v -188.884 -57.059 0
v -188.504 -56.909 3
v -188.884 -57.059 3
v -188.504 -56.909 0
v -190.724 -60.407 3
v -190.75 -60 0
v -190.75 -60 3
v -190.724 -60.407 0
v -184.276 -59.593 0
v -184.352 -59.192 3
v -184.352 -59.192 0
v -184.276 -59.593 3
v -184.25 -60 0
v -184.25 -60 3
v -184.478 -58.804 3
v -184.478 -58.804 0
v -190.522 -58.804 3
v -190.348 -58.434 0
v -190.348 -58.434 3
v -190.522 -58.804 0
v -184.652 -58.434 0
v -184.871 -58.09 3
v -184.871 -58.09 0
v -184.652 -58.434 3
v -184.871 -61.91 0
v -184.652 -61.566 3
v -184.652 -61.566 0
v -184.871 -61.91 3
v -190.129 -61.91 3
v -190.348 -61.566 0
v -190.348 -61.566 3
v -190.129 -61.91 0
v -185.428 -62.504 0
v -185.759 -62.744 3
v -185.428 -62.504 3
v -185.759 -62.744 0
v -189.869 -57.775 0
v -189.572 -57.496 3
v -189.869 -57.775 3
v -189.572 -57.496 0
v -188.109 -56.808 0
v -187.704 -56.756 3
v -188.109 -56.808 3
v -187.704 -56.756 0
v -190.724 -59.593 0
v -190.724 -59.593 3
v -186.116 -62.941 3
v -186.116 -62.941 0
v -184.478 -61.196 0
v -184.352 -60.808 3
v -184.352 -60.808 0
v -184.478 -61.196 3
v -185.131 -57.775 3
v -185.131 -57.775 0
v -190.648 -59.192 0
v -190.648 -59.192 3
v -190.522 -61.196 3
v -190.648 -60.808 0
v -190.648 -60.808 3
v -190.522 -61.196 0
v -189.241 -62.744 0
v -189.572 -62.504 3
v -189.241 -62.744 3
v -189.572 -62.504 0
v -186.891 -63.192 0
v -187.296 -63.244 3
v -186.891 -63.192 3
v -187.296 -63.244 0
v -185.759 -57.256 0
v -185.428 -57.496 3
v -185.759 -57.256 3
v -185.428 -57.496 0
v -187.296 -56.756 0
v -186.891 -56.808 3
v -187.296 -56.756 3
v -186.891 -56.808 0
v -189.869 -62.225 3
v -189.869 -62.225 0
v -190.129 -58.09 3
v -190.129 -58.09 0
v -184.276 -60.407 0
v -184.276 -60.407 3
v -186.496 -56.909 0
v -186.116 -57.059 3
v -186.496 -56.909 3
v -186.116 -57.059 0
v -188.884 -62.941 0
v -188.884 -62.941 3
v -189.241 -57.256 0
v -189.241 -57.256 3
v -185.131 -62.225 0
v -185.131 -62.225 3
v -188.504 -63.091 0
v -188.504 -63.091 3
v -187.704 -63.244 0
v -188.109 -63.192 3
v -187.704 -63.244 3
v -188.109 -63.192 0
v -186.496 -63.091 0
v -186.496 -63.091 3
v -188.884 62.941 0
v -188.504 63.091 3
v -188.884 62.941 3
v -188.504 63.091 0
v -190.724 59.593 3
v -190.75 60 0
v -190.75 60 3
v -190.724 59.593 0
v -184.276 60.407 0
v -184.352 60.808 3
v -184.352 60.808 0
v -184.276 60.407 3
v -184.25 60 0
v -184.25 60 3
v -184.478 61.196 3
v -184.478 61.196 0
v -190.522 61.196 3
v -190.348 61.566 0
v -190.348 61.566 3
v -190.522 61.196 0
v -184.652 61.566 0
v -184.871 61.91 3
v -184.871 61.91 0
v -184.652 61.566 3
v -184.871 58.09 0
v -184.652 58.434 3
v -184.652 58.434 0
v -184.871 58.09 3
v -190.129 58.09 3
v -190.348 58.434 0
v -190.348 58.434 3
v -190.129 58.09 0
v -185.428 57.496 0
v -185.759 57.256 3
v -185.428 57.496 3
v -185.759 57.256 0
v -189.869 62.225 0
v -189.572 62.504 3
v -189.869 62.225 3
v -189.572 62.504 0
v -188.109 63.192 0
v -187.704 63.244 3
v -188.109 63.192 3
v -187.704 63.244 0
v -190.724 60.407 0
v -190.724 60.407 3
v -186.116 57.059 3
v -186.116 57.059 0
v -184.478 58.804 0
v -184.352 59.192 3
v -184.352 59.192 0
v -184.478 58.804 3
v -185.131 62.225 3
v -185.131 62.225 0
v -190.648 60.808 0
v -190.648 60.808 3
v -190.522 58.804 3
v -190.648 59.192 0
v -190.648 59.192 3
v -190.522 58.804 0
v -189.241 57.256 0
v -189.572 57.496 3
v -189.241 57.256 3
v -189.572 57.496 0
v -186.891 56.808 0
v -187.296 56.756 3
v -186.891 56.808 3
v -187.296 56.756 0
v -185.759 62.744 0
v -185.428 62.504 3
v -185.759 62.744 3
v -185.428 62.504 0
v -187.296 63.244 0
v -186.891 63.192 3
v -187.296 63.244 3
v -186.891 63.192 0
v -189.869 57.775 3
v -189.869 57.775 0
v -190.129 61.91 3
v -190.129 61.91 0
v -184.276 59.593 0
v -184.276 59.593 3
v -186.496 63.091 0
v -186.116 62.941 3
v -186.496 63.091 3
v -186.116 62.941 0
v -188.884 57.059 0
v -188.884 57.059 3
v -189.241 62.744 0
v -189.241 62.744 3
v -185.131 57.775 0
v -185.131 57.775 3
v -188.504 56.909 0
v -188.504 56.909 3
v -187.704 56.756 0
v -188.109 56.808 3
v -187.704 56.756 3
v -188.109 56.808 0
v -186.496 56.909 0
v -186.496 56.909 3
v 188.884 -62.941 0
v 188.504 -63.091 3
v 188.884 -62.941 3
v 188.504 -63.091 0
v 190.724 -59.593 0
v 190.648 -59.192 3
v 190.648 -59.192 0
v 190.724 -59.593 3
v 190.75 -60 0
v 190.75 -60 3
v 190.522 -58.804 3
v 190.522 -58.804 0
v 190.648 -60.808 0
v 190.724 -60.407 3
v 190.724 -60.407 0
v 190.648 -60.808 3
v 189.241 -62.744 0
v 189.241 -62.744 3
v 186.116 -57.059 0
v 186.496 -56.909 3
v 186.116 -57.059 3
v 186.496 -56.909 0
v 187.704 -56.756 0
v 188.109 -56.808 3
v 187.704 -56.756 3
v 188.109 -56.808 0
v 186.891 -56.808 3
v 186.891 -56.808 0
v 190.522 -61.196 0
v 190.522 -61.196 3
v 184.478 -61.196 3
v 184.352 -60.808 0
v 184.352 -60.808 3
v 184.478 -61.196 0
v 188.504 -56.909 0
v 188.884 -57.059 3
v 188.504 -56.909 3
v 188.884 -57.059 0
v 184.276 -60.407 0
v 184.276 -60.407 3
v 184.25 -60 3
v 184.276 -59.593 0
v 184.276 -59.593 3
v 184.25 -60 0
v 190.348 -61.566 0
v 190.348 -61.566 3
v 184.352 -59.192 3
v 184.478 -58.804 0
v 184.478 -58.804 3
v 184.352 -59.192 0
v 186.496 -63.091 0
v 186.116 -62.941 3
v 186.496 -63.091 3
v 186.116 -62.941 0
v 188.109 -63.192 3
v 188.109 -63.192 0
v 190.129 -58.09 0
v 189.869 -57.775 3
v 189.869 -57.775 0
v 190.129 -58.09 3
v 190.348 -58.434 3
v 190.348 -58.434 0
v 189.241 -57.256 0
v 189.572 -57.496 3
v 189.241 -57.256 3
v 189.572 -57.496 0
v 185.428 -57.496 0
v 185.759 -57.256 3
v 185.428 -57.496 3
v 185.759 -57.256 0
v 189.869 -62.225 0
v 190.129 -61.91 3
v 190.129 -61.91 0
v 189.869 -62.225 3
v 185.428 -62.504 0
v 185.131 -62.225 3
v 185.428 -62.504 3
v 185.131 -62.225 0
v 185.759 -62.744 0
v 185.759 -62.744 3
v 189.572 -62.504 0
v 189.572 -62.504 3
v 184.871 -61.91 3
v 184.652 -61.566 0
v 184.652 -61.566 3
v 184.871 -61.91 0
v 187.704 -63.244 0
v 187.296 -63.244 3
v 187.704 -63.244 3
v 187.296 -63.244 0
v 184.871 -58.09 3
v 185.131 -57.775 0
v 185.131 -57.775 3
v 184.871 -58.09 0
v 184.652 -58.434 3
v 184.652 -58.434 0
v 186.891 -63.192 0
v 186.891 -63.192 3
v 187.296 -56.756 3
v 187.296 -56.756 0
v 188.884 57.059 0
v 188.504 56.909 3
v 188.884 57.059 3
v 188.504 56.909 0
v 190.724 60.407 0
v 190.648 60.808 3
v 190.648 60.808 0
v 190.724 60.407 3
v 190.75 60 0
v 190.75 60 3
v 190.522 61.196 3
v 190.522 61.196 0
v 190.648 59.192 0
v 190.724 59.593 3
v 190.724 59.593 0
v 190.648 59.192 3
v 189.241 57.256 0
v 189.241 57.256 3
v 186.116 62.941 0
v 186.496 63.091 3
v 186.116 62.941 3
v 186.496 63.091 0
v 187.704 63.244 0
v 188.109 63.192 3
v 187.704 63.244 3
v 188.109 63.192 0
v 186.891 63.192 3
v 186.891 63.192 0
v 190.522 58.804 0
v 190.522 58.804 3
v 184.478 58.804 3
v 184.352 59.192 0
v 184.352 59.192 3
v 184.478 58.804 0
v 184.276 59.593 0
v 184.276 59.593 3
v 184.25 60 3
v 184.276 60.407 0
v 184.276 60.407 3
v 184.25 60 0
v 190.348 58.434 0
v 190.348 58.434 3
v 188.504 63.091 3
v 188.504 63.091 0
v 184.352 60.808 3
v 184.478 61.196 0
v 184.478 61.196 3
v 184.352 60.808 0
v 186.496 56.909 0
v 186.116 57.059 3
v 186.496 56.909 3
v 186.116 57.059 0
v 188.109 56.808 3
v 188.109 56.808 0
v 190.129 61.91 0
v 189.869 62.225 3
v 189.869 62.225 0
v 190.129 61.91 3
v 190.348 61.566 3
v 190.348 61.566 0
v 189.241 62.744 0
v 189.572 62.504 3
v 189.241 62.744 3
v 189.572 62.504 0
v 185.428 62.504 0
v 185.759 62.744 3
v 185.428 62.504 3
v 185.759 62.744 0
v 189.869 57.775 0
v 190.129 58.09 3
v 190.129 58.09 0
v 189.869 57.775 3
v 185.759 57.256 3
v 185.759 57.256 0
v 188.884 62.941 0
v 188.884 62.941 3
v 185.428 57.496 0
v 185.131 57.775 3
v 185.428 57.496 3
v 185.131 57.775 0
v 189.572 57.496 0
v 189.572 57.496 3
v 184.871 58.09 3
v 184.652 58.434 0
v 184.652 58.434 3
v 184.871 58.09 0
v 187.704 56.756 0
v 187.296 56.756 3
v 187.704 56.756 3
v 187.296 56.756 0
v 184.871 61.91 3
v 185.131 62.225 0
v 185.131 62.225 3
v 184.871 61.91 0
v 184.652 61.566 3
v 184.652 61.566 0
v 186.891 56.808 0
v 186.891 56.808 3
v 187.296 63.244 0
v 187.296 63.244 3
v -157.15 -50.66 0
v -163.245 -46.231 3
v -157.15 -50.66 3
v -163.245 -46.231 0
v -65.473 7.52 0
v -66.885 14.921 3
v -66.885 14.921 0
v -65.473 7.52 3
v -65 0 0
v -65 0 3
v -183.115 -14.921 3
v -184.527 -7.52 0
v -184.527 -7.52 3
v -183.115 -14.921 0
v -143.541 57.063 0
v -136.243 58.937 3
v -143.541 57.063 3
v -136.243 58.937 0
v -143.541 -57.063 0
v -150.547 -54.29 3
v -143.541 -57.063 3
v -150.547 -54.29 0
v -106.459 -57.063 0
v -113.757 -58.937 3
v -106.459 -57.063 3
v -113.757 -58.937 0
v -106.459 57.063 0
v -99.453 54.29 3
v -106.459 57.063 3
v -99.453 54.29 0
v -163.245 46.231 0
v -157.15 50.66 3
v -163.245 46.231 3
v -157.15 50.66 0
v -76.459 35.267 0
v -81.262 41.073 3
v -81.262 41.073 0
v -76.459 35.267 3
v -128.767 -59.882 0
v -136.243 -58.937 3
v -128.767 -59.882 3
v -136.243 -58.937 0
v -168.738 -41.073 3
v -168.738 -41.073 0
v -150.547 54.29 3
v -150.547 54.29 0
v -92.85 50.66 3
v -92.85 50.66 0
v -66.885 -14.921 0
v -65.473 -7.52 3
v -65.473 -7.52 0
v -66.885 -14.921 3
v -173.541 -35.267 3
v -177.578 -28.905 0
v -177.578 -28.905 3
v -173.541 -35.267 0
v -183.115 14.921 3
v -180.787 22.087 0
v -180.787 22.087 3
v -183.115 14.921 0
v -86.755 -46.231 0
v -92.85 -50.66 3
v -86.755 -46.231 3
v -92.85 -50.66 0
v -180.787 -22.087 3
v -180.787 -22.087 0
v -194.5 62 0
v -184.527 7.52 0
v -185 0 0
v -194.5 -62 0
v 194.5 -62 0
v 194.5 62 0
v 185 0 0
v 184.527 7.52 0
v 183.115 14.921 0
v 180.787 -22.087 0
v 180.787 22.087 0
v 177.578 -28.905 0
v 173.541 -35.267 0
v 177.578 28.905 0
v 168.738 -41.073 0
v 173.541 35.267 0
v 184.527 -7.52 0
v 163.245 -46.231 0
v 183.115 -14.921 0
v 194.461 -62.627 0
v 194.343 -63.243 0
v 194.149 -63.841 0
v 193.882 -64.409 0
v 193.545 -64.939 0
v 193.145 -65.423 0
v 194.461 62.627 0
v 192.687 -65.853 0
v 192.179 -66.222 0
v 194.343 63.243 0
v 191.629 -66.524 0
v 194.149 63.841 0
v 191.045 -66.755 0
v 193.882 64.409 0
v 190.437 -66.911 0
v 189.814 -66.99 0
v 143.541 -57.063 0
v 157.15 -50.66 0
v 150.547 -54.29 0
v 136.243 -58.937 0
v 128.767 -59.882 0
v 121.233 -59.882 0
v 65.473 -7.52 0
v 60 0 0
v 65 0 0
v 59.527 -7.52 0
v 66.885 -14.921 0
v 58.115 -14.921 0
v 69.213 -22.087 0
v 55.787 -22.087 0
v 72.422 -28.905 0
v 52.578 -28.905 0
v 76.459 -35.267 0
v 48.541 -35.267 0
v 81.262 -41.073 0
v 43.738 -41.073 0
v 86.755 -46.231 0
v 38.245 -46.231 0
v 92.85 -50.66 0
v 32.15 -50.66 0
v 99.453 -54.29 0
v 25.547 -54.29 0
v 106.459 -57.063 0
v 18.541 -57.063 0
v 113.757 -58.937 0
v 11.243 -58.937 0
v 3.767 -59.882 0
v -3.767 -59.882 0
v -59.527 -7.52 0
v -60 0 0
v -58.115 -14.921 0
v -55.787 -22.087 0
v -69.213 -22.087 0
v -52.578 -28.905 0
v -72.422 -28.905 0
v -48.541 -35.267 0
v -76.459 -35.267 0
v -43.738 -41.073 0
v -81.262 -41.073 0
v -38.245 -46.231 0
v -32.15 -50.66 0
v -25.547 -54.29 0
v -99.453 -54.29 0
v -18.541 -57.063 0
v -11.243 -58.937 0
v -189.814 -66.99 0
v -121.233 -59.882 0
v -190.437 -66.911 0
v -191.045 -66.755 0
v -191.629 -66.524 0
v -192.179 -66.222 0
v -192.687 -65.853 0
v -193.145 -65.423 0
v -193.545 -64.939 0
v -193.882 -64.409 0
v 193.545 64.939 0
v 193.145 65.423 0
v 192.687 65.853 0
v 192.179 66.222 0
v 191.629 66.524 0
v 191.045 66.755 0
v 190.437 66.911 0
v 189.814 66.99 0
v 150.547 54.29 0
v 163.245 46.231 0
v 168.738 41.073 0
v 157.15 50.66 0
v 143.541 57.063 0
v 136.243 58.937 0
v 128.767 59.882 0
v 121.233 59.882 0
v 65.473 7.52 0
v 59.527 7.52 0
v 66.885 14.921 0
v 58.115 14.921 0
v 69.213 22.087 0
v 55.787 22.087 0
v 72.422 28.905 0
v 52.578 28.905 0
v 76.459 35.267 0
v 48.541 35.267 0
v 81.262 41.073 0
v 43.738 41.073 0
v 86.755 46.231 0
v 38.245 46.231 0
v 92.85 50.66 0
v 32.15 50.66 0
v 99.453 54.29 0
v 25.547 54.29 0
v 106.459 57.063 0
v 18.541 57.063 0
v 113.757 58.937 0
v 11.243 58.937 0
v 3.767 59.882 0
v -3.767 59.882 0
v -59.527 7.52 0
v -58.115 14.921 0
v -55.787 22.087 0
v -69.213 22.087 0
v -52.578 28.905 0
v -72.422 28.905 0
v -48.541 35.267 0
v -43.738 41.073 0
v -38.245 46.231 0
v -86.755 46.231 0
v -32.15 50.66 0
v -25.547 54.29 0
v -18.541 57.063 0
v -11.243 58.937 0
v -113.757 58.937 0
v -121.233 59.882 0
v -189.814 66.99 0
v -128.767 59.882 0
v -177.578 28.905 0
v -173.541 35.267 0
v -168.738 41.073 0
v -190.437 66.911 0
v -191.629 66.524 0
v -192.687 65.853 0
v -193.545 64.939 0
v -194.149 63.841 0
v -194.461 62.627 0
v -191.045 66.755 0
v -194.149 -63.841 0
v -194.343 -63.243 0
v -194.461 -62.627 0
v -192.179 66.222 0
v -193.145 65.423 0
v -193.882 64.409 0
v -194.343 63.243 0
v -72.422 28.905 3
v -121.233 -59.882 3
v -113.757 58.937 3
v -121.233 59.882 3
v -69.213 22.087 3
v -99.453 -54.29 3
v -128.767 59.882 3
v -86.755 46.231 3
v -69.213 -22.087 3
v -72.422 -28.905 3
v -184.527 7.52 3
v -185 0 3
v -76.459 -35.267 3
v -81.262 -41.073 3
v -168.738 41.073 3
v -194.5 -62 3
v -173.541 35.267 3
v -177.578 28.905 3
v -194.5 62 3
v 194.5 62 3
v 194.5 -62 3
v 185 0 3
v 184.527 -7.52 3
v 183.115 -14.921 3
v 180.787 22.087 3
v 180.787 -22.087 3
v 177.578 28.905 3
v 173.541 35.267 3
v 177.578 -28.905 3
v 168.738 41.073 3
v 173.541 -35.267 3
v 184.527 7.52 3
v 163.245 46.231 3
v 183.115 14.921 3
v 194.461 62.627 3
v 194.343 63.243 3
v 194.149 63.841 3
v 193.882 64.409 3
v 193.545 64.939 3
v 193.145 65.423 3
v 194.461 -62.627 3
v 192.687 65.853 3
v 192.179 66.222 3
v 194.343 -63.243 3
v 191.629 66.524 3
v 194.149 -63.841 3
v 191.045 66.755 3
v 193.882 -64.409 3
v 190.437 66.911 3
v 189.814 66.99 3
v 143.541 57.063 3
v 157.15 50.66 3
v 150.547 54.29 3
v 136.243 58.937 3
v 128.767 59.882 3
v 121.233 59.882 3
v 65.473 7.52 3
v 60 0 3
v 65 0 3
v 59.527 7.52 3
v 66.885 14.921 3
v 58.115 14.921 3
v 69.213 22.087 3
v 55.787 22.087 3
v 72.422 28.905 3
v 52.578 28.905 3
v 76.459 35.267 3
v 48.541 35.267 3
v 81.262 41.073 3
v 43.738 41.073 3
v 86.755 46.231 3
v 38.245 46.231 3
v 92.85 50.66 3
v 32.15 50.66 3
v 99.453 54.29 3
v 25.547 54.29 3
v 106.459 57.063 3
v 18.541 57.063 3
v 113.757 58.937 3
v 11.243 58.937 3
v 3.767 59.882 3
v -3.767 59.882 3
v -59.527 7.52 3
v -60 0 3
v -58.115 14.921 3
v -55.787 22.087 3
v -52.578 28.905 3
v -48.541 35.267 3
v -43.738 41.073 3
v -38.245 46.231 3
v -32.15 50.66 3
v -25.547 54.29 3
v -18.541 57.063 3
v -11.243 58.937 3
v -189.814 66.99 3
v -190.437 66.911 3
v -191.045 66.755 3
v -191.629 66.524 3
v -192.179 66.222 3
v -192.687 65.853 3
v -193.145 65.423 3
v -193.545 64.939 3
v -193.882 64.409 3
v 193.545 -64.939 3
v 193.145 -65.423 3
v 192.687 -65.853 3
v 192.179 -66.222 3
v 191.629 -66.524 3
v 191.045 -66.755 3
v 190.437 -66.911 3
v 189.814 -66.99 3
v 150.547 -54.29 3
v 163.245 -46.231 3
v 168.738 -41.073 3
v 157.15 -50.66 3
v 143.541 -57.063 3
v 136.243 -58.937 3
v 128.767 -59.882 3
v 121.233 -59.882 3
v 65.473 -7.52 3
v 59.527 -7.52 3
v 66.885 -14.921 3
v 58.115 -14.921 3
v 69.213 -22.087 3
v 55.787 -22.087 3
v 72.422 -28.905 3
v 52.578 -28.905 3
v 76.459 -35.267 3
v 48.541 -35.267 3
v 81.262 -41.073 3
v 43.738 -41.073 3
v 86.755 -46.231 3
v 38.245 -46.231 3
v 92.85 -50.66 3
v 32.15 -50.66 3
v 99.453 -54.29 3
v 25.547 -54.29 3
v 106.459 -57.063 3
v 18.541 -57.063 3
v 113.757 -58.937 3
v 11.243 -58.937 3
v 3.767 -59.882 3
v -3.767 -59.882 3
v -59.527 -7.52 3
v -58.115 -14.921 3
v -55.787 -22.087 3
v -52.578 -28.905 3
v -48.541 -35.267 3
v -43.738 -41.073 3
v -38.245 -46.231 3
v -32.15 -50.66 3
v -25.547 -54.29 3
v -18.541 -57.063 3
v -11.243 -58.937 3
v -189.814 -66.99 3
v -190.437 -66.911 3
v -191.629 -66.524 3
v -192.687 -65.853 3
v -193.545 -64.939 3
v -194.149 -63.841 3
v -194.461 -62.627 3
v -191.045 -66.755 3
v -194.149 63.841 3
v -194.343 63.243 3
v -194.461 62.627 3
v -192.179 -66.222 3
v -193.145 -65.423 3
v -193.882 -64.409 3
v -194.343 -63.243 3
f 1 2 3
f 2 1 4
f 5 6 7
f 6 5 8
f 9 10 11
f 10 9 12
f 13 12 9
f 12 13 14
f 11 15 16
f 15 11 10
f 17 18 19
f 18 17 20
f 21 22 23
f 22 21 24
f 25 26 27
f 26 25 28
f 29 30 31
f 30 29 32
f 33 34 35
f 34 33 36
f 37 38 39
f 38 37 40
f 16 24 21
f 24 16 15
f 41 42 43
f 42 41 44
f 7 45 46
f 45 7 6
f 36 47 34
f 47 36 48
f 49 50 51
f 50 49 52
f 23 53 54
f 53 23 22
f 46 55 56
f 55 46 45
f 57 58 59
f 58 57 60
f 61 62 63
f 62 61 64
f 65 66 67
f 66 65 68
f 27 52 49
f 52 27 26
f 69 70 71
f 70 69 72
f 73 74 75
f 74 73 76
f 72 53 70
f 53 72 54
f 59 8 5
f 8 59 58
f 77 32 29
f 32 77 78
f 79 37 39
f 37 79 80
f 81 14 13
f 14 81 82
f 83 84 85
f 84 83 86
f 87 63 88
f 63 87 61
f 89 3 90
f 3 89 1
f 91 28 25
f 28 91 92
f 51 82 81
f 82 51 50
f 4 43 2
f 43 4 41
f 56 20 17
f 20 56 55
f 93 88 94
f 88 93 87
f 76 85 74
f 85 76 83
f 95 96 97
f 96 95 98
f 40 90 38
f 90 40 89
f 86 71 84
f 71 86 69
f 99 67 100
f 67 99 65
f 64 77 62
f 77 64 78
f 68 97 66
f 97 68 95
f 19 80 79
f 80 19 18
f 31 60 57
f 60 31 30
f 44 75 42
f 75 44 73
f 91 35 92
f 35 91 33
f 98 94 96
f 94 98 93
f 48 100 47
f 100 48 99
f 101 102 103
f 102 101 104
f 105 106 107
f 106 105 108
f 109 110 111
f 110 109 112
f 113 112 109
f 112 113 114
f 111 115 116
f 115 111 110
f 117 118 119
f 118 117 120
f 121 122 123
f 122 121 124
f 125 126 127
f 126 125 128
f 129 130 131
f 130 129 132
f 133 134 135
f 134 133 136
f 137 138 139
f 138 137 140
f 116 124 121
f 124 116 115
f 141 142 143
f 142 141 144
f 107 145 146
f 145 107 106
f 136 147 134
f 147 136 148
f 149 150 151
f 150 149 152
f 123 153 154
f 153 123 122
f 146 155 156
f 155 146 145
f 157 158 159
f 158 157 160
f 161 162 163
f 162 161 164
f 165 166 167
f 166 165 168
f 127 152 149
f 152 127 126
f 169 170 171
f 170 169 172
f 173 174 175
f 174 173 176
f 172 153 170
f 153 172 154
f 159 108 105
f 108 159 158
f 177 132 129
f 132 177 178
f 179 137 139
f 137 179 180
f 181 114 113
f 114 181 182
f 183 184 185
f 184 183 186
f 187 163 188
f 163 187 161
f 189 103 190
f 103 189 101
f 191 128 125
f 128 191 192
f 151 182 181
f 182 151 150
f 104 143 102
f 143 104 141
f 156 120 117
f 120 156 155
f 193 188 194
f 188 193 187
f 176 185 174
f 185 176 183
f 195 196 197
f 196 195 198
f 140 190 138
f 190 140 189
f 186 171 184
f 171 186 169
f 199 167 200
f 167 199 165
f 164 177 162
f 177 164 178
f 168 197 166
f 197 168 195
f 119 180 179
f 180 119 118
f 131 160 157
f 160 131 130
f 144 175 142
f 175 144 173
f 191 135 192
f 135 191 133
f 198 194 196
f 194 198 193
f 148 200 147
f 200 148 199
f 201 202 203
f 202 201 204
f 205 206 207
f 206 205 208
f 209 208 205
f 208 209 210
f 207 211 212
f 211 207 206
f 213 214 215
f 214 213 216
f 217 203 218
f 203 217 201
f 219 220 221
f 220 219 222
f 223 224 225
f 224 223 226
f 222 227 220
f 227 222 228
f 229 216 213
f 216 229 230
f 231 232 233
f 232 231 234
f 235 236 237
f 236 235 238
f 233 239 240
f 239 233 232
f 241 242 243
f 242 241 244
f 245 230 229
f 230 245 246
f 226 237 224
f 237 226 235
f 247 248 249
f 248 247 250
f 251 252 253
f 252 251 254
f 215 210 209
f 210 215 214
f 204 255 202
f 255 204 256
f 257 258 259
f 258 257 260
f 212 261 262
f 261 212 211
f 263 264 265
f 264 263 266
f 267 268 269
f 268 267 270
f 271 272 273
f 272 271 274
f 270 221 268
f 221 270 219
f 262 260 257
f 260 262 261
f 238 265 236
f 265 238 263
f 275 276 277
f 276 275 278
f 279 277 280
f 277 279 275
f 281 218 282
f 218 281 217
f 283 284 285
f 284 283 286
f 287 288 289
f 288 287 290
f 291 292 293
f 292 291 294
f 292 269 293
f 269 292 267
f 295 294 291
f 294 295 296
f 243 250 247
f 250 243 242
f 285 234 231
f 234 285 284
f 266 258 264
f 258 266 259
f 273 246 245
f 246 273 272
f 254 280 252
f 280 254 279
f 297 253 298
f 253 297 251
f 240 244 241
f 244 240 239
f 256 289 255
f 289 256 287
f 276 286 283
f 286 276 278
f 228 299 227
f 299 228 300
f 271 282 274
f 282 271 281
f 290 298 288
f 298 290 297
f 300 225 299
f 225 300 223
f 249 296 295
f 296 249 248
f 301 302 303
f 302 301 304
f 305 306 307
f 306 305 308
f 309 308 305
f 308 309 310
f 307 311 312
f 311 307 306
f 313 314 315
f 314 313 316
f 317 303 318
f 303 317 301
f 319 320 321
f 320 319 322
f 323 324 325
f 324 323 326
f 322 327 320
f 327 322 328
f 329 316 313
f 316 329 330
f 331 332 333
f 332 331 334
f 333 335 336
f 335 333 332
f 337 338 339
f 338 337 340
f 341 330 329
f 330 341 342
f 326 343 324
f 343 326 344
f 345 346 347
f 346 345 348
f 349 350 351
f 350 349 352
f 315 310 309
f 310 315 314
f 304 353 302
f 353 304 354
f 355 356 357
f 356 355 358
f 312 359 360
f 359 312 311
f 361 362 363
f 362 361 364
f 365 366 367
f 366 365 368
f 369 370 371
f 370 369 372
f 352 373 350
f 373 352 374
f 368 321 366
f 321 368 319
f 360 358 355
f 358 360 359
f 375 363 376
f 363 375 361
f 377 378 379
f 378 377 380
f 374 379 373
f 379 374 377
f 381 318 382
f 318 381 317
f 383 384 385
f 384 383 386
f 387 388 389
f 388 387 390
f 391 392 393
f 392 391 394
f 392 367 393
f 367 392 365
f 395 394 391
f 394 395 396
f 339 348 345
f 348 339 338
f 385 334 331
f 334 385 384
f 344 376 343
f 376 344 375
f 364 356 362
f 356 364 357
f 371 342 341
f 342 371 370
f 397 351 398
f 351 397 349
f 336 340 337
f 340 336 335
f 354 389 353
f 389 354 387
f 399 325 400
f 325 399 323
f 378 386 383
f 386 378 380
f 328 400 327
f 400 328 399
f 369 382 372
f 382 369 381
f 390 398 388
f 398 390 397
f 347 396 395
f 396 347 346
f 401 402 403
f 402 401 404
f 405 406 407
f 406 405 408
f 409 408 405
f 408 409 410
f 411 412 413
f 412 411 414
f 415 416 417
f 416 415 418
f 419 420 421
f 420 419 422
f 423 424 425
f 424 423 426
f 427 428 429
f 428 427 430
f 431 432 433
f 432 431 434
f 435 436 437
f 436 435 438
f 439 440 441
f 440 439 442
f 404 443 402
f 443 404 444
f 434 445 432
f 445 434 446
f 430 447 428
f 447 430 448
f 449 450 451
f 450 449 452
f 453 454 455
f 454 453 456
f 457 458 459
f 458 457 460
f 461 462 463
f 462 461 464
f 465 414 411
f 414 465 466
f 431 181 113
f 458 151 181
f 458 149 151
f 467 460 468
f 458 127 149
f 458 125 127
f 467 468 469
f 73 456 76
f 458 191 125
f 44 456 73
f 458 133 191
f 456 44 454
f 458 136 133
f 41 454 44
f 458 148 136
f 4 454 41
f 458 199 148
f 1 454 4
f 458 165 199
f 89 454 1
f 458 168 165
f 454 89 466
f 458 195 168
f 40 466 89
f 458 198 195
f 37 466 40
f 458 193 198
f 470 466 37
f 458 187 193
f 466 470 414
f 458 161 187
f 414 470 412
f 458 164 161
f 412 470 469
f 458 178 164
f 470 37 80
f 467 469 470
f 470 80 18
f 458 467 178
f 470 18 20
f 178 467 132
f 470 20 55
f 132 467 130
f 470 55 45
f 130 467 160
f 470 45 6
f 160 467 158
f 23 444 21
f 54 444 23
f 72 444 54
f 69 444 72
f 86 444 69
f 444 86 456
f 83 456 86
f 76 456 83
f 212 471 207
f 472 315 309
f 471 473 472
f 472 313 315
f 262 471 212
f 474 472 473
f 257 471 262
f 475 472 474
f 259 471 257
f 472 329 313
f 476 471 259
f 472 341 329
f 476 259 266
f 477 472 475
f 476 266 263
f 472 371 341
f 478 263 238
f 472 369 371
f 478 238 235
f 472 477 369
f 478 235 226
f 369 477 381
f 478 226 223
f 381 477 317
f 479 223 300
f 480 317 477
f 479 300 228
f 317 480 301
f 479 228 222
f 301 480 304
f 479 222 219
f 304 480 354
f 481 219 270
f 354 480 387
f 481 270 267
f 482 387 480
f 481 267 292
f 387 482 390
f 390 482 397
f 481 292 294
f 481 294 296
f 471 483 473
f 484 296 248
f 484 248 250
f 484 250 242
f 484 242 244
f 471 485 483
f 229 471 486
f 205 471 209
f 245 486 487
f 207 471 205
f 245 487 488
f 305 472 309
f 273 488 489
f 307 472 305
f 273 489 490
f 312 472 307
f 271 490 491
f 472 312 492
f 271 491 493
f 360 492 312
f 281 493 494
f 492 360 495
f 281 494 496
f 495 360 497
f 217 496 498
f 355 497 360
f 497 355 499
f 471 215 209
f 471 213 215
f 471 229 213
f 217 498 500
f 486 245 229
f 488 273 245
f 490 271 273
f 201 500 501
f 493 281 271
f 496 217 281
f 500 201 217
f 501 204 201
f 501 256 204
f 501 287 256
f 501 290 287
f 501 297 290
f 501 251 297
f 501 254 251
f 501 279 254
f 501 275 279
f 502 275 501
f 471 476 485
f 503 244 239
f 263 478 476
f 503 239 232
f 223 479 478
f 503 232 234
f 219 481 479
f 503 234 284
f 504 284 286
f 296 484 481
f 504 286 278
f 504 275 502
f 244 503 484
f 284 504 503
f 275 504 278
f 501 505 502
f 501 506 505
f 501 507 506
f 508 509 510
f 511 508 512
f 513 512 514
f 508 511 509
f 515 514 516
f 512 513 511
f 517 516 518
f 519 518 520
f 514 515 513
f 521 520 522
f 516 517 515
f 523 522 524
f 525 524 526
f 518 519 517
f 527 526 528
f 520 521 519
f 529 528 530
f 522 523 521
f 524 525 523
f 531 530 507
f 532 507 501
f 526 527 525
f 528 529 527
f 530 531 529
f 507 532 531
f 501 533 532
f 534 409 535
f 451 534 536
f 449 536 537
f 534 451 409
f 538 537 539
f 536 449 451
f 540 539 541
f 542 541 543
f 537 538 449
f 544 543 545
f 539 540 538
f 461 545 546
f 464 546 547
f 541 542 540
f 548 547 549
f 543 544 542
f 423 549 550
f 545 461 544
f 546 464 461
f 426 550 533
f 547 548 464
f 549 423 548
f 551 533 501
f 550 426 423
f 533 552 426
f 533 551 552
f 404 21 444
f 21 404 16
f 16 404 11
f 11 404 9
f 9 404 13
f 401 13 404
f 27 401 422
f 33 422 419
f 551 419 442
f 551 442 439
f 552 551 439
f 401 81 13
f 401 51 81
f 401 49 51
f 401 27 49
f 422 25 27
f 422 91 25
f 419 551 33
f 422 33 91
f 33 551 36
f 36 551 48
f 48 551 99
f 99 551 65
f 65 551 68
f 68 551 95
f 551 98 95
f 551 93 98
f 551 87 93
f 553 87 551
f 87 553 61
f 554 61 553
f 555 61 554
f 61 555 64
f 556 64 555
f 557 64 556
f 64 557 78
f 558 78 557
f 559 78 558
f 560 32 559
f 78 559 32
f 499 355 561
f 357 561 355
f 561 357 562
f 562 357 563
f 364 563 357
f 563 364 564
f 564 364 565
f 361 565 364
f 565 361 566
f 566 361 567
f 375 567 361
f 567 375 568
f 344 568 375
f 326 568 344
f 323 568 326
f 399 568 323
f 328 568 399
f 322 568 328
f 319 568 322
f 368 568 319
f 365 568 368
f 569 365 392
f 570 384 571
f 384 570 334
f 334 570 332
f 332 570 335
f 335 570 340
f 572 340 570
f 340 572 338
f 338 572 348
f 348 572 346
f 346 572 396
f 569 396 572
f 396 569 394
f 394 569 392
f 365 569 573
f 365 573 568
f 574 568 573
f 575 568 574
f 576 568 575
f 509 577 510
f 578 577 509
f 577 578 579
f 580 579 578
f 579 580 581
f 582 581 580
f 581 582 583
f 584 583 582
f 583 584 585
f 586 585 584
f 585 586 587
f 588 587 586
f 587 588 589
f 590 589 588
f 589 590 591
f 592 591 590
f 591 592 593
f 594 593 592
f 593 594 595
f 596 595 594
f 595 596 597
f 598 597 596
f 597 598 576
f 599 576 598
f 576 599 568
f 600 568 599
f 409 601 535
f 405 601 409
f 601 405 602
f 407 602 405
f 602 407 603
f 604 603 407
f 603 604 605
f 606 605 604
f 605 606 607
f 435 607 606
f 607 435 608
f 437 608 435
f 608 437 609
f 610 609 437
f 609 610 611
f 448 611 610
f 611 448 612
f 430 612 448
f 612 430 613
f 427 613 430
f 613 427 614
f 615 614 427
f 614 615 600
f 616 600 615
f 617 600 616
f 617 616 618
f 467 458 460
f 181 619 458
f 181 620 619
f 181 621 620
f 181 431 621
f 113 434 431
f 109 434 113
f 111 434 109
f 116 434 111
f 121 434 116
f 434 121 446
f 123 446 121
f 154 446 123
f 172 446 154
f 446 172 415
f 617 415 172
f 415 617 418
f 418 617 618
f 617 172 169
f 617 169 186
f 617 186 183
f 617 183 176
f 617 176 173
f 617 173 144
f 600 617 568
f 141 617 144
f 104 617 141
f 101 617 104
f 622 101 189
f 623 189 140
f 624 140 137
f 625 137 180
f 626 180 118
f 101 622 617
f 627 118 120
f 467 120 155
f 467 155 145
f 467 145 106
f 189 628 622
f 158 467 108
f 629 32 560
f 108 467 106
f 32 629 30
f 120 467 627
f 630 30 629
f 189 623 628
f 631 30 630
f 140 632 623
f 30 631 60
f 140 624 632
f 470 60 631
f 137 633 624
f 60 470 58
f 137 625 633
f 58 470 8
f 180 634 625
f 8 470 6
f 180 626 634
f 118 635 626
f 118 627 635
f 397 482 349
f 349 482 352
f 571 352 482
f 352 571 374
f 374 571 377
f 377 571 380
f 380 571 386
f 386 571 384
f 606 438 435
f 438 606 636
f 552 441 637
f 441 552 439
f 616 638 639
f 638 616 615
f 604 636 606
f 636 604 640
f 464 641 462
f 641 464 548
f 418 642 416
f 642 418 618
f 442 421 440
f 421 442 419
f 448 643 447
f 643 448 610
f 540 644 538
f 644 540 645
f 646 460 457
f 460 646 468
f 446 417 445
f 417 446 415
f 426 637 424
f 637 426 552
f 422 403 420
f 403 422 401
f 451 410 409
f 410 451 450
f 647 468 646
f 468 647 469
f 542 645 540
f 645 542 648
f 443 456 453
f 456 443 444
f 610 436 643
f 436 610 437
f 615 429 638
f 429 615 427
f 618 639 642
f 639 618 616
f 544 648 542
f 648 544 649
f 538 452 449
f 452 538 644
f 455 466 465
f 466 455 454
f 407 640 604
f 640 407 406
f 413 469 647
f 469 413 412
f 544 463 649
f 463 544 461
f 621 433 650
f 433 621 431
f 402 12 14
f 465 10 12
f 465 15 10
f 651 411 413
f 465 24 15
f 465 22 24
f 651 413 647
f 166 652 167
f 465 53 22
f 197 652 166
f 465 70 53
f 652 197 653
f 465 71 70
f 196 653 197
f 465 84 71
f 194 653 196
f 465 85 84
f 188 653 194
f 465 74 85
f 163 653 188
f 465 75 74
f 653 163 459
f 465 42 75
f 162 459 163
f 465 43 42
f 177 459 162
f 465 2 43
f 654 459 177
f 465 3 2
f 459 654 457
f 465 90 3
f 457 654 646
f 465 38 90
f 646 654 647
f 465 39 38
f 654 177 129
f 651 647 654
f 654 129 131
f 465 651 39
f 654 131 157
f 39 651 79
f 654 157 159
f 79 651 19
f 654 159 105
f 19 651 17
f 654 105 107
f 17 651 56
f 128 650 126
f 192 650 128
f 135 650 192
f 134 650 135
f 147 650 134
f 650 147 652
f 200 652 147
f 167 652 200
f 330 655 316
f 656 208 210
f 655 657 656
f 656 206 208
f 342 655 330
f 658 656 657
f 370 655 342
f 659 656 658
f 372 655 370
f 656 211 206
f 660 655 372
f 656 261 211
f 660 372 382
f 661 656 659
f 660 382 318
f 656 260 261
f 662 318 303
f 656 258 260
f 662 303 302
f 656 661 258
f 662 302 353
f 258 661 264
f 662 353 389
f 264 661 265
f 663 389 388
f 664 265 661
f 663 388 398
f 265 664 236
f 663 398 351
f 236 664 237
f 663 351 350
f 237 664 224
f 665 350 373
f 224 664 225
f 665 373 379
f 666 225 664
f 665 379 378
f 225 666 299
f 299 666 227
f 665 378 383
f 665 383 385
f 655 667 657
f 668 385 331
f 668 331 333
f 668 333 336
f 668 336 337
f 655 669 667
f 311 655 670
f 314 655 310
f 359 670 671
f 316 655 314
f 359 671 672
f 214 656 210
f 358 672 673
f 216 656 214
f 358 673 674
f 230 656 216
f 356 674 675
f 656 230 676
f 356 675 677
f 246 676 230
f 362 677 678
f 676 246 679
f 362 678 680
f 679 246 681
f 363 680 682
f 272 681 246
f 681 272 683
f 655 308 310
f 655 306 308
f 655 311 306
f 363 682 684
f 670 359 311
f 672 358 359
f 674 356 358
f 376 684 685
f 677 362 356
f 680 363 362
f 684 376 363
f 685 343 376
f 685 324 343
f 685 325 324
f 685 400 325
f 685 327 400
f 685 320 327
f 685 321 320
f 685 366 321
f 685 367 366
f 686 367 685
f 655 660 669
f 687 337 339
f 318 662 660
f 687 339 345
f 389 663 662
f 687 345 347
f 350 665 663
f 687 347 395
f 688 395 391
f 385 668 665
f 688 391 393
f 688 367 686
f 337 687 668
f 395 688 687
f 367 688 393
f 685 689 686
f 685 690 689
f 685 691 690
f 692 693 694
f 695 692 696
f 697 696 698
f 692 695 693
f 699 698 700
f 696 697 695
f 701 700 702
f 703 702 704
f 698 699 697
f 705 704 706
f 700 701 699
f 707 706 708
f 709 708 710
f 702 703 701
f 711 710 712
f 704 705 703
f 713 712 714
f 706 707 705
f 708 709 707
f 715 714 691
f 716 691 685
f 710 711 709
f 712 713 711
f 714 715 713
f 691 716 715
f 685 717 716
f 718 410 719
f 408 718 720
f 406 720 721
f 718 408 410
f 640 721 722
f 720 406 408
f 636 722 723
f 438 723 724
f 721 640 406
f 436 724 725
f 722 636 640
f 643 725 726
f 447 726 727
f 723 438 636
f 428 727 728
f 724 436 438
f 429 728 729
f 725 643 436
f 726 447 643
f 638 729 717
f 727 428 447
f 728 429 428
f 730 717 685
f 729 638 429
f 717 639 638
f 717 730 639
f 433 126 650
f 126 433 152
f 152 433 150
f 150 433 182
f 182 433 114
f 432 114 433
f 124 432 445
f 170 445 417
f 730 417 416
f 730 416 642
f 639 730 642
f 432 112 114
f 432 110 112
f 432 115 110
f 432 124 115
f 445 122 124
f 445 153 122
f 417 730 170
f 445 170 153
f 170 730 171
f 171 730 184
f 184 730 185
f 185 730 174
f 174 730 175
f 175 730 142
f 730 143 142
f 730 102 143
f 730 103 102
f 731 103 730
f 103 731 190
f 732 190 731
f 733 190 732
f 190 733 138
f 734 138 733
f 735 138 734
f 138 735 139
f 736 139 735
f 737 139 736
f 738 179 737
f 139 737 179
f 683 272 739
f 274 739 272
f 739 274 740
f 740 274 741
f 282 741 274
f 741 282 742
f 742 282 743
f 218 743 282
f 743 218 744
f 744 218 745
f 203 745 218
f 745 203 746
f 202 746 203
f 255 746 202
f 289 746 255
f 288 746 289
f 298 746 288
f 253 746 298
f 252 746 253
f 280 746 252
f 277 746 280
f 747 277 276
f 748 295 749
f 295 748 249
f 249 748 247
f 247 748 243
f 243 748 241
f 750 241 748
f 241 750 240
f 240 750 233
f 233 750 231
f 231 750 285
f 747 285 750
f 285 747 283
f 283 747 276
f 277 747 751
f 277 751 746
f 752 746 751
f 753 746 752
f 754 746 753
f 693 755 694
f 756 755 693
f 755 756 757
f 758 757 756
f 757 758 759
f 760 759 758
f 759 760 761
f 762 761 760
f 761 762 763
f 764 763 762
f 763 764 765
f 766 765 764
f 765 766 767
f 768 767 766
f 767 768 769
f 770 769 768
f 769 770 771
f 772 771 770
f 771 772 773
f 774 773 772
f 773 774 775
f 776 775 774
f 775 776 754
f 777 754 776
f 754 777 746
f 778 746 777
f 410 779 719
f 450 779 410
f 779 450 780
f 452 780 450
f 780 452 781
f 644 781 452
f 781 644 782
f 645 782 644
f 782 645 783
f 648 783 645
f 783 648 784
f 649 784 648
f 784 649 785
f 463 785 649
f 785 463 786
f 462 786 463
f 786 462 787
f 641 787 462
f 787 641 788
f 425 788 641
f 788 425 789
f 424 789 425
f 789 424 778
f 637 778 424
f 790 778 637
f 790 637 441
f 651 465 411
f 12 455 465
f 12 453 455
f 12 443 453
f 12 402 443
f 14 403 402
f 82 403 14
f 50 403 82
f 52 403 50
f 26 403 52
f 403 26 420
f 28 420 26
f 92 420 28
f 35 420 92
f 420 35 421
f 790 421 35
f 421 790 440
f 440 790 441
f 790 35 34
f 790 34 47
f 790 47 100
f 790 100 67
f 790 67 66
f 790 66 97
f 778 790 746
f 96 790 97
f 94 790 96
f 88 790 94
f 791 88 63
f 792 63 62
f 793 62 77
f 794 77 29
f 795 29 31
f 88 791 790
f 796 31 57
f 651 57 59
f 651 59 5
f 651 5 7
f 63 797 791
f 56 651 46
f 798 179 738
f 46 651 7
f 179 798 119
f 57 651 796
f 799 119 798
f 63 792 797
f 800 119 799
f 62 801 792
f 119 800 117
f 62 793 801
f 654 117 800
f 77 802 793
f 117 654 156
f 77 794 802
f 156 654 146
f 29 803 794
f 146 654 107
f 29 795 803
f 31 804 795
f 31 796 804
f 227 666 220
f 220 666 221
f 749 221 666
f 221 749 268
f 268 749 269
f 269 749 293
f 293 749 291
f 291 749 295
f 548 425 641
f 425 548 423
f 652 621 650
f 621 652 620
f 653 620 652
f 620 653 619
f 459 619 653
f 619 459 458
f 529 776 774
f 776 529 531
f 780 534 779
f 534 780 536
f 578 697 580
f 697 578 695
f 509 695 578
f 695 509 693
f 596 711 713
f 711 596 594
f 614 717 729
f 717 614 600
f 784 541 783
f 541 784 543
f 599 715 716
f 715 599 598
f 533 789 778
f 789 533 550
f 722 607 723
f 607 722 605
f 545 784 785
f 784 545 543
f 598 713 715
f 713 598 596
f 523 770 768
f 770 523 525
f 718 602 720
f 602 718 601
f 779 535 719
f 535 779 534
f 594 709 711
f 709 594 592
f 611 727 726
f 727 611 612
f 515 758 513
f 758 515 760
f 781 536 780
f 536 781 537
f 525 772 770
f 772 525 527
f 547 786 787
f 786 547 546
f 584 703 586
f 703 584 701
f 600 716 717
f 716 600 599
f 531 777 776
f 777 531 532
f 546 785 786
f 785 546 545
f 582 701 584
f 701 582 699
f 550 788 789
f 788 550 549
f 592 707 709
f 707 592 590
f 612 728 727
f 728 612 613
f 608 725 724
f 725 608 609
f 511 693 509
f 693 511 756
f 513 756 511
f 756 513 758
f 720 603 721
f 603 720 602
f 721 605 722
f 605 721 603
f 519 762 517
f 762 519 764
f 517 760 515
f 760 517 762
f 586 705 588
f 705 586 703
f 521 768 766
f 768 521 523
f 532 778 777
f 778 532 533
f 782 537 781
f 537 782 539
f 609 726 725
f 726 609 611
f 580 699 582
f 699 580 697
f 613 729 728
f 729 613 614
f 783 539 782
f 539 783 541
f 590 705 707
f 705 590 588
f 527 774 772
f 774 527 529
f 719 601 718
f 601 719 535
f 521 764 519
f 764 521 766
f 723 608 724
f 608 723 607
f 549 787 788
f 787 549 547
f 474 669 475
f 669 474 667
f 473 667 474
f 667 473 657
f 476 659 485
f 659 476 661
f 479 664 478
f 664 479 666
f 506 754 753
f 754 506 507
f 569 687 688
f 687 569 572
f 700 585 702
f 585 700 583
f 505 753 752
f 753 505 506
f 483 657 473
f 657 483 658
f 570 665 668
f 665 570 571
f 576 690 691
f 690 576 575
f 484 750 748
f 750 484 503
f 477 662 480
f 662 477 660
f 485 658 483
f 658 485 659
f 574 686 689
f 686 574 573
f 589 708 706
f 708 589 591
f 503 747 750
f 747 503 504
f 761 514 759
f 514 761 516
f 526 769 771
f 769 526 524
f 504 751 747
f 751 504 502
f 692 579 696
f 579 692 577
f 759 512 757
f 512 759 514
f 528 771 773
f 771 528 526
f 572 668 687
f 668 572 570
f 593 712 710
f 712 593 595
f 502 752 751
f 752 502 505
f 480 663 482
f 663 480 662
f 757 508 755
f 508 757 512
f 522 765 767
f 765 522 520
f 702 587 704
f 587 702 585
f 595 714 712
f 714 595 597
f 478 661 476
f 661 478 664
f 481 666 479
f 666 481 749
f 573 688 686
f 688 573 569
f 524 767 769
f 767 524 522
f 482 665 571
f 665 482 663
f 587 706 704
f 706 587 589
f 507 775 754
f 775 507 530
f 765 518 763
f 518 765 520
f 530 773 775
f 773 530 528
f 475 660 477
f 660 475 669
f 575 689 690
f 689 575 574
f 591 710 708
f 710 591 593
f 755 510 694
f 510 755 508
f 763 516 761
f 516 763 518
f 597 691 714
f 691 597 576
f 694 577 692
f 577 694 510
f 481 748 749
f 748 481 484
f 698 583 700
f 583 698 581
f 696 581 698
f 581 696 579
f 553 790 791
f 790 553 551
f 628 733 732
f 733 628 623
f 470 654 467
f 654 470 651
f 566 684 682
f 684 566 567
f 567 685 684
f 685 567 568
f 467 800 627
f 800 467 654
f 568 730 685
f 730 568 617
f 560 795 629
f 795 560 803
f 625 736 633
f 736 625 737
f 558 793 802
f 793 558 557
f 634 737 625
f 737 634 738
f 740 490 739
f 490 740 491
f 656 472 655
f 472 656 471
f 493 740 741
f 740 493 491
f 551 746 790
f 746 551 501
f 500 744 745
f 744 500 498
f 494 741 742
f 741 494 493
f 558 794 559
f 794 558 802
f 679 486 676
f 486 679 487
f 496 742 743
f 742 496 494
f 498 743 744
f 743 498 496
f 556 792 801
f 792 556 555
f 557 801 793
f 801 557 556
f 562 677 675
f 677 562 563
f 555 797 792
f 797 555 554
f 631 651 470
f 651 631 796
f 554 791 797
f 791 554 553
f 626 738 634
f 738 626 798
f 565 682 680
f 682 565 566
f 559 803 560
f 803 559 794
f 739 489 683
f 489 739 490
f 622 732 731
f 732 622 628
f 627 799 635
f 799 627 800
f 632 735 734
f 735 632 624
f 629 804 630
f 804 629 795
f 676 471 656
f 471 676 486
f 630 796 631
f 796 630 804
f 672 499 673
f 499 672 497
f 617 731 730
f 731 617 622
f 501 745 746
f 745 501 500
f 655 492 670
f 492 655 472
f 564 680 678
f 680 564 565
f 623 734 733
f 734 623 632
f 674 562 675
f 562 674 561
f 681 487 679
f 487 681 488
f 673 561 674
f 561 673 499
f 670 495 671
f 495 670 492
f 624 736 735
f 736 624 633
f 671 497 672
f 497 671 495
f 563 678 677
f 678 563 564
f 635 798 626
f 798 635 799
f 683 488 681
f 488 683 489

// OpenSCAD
$fn = 50;


difference() {
	union() {
		hull() {
			translate(v = [-189.5000000000, 62.0000000000, 0]) {
				cylinder(h = 3, r = 5);
			}
			translate(v = [189.5000000000, 62.0000000000, 0]) {
				cylinder(h = 3, r = 5);
			}
			translate(v = [-189.5000000000, -62.0000000000, 0]) {
				cylinder(h = 3, r = 5);
			}
			translate(v = [189.5000000000, -62.0000000000, 0]) {
				cylinder(h = 3, r = 5);
			}
		}
	}
	union() {
		#translate(v = [-187.5000000000, -60.0000000000, -100.0000000000]) {
			cylinder(h = 200, r = 3.2500000000);
		}
		#translate(v = [-187.5000000000, 60.0000000000, -100.0000000000]) {
			cylinder(h = 200, r = 3.2500000000);
		}
		#translate(v = [187.5000000000, -60.0000000000, -100.0000000000]) {
			cylinder(h = 200, r = 3.2500000000);
		}
		#translate(v = [187.5000000000, 60.0000000000, -100.0000000000]) {
			cylinder(h = 200, r = 3.2500000000);
		}
		#translate(v = [-125.0000000000, 0, 0]) {
			cylinder(h = 3, r = 60.0000000000);
		}
		#cylinder(h = 3, r = 60.0000000000);
		#translate(v = [125.0000000000, 0, 0]) {
			cylinder(h = 3, r = 60.0000000000);
		}
	}
}
